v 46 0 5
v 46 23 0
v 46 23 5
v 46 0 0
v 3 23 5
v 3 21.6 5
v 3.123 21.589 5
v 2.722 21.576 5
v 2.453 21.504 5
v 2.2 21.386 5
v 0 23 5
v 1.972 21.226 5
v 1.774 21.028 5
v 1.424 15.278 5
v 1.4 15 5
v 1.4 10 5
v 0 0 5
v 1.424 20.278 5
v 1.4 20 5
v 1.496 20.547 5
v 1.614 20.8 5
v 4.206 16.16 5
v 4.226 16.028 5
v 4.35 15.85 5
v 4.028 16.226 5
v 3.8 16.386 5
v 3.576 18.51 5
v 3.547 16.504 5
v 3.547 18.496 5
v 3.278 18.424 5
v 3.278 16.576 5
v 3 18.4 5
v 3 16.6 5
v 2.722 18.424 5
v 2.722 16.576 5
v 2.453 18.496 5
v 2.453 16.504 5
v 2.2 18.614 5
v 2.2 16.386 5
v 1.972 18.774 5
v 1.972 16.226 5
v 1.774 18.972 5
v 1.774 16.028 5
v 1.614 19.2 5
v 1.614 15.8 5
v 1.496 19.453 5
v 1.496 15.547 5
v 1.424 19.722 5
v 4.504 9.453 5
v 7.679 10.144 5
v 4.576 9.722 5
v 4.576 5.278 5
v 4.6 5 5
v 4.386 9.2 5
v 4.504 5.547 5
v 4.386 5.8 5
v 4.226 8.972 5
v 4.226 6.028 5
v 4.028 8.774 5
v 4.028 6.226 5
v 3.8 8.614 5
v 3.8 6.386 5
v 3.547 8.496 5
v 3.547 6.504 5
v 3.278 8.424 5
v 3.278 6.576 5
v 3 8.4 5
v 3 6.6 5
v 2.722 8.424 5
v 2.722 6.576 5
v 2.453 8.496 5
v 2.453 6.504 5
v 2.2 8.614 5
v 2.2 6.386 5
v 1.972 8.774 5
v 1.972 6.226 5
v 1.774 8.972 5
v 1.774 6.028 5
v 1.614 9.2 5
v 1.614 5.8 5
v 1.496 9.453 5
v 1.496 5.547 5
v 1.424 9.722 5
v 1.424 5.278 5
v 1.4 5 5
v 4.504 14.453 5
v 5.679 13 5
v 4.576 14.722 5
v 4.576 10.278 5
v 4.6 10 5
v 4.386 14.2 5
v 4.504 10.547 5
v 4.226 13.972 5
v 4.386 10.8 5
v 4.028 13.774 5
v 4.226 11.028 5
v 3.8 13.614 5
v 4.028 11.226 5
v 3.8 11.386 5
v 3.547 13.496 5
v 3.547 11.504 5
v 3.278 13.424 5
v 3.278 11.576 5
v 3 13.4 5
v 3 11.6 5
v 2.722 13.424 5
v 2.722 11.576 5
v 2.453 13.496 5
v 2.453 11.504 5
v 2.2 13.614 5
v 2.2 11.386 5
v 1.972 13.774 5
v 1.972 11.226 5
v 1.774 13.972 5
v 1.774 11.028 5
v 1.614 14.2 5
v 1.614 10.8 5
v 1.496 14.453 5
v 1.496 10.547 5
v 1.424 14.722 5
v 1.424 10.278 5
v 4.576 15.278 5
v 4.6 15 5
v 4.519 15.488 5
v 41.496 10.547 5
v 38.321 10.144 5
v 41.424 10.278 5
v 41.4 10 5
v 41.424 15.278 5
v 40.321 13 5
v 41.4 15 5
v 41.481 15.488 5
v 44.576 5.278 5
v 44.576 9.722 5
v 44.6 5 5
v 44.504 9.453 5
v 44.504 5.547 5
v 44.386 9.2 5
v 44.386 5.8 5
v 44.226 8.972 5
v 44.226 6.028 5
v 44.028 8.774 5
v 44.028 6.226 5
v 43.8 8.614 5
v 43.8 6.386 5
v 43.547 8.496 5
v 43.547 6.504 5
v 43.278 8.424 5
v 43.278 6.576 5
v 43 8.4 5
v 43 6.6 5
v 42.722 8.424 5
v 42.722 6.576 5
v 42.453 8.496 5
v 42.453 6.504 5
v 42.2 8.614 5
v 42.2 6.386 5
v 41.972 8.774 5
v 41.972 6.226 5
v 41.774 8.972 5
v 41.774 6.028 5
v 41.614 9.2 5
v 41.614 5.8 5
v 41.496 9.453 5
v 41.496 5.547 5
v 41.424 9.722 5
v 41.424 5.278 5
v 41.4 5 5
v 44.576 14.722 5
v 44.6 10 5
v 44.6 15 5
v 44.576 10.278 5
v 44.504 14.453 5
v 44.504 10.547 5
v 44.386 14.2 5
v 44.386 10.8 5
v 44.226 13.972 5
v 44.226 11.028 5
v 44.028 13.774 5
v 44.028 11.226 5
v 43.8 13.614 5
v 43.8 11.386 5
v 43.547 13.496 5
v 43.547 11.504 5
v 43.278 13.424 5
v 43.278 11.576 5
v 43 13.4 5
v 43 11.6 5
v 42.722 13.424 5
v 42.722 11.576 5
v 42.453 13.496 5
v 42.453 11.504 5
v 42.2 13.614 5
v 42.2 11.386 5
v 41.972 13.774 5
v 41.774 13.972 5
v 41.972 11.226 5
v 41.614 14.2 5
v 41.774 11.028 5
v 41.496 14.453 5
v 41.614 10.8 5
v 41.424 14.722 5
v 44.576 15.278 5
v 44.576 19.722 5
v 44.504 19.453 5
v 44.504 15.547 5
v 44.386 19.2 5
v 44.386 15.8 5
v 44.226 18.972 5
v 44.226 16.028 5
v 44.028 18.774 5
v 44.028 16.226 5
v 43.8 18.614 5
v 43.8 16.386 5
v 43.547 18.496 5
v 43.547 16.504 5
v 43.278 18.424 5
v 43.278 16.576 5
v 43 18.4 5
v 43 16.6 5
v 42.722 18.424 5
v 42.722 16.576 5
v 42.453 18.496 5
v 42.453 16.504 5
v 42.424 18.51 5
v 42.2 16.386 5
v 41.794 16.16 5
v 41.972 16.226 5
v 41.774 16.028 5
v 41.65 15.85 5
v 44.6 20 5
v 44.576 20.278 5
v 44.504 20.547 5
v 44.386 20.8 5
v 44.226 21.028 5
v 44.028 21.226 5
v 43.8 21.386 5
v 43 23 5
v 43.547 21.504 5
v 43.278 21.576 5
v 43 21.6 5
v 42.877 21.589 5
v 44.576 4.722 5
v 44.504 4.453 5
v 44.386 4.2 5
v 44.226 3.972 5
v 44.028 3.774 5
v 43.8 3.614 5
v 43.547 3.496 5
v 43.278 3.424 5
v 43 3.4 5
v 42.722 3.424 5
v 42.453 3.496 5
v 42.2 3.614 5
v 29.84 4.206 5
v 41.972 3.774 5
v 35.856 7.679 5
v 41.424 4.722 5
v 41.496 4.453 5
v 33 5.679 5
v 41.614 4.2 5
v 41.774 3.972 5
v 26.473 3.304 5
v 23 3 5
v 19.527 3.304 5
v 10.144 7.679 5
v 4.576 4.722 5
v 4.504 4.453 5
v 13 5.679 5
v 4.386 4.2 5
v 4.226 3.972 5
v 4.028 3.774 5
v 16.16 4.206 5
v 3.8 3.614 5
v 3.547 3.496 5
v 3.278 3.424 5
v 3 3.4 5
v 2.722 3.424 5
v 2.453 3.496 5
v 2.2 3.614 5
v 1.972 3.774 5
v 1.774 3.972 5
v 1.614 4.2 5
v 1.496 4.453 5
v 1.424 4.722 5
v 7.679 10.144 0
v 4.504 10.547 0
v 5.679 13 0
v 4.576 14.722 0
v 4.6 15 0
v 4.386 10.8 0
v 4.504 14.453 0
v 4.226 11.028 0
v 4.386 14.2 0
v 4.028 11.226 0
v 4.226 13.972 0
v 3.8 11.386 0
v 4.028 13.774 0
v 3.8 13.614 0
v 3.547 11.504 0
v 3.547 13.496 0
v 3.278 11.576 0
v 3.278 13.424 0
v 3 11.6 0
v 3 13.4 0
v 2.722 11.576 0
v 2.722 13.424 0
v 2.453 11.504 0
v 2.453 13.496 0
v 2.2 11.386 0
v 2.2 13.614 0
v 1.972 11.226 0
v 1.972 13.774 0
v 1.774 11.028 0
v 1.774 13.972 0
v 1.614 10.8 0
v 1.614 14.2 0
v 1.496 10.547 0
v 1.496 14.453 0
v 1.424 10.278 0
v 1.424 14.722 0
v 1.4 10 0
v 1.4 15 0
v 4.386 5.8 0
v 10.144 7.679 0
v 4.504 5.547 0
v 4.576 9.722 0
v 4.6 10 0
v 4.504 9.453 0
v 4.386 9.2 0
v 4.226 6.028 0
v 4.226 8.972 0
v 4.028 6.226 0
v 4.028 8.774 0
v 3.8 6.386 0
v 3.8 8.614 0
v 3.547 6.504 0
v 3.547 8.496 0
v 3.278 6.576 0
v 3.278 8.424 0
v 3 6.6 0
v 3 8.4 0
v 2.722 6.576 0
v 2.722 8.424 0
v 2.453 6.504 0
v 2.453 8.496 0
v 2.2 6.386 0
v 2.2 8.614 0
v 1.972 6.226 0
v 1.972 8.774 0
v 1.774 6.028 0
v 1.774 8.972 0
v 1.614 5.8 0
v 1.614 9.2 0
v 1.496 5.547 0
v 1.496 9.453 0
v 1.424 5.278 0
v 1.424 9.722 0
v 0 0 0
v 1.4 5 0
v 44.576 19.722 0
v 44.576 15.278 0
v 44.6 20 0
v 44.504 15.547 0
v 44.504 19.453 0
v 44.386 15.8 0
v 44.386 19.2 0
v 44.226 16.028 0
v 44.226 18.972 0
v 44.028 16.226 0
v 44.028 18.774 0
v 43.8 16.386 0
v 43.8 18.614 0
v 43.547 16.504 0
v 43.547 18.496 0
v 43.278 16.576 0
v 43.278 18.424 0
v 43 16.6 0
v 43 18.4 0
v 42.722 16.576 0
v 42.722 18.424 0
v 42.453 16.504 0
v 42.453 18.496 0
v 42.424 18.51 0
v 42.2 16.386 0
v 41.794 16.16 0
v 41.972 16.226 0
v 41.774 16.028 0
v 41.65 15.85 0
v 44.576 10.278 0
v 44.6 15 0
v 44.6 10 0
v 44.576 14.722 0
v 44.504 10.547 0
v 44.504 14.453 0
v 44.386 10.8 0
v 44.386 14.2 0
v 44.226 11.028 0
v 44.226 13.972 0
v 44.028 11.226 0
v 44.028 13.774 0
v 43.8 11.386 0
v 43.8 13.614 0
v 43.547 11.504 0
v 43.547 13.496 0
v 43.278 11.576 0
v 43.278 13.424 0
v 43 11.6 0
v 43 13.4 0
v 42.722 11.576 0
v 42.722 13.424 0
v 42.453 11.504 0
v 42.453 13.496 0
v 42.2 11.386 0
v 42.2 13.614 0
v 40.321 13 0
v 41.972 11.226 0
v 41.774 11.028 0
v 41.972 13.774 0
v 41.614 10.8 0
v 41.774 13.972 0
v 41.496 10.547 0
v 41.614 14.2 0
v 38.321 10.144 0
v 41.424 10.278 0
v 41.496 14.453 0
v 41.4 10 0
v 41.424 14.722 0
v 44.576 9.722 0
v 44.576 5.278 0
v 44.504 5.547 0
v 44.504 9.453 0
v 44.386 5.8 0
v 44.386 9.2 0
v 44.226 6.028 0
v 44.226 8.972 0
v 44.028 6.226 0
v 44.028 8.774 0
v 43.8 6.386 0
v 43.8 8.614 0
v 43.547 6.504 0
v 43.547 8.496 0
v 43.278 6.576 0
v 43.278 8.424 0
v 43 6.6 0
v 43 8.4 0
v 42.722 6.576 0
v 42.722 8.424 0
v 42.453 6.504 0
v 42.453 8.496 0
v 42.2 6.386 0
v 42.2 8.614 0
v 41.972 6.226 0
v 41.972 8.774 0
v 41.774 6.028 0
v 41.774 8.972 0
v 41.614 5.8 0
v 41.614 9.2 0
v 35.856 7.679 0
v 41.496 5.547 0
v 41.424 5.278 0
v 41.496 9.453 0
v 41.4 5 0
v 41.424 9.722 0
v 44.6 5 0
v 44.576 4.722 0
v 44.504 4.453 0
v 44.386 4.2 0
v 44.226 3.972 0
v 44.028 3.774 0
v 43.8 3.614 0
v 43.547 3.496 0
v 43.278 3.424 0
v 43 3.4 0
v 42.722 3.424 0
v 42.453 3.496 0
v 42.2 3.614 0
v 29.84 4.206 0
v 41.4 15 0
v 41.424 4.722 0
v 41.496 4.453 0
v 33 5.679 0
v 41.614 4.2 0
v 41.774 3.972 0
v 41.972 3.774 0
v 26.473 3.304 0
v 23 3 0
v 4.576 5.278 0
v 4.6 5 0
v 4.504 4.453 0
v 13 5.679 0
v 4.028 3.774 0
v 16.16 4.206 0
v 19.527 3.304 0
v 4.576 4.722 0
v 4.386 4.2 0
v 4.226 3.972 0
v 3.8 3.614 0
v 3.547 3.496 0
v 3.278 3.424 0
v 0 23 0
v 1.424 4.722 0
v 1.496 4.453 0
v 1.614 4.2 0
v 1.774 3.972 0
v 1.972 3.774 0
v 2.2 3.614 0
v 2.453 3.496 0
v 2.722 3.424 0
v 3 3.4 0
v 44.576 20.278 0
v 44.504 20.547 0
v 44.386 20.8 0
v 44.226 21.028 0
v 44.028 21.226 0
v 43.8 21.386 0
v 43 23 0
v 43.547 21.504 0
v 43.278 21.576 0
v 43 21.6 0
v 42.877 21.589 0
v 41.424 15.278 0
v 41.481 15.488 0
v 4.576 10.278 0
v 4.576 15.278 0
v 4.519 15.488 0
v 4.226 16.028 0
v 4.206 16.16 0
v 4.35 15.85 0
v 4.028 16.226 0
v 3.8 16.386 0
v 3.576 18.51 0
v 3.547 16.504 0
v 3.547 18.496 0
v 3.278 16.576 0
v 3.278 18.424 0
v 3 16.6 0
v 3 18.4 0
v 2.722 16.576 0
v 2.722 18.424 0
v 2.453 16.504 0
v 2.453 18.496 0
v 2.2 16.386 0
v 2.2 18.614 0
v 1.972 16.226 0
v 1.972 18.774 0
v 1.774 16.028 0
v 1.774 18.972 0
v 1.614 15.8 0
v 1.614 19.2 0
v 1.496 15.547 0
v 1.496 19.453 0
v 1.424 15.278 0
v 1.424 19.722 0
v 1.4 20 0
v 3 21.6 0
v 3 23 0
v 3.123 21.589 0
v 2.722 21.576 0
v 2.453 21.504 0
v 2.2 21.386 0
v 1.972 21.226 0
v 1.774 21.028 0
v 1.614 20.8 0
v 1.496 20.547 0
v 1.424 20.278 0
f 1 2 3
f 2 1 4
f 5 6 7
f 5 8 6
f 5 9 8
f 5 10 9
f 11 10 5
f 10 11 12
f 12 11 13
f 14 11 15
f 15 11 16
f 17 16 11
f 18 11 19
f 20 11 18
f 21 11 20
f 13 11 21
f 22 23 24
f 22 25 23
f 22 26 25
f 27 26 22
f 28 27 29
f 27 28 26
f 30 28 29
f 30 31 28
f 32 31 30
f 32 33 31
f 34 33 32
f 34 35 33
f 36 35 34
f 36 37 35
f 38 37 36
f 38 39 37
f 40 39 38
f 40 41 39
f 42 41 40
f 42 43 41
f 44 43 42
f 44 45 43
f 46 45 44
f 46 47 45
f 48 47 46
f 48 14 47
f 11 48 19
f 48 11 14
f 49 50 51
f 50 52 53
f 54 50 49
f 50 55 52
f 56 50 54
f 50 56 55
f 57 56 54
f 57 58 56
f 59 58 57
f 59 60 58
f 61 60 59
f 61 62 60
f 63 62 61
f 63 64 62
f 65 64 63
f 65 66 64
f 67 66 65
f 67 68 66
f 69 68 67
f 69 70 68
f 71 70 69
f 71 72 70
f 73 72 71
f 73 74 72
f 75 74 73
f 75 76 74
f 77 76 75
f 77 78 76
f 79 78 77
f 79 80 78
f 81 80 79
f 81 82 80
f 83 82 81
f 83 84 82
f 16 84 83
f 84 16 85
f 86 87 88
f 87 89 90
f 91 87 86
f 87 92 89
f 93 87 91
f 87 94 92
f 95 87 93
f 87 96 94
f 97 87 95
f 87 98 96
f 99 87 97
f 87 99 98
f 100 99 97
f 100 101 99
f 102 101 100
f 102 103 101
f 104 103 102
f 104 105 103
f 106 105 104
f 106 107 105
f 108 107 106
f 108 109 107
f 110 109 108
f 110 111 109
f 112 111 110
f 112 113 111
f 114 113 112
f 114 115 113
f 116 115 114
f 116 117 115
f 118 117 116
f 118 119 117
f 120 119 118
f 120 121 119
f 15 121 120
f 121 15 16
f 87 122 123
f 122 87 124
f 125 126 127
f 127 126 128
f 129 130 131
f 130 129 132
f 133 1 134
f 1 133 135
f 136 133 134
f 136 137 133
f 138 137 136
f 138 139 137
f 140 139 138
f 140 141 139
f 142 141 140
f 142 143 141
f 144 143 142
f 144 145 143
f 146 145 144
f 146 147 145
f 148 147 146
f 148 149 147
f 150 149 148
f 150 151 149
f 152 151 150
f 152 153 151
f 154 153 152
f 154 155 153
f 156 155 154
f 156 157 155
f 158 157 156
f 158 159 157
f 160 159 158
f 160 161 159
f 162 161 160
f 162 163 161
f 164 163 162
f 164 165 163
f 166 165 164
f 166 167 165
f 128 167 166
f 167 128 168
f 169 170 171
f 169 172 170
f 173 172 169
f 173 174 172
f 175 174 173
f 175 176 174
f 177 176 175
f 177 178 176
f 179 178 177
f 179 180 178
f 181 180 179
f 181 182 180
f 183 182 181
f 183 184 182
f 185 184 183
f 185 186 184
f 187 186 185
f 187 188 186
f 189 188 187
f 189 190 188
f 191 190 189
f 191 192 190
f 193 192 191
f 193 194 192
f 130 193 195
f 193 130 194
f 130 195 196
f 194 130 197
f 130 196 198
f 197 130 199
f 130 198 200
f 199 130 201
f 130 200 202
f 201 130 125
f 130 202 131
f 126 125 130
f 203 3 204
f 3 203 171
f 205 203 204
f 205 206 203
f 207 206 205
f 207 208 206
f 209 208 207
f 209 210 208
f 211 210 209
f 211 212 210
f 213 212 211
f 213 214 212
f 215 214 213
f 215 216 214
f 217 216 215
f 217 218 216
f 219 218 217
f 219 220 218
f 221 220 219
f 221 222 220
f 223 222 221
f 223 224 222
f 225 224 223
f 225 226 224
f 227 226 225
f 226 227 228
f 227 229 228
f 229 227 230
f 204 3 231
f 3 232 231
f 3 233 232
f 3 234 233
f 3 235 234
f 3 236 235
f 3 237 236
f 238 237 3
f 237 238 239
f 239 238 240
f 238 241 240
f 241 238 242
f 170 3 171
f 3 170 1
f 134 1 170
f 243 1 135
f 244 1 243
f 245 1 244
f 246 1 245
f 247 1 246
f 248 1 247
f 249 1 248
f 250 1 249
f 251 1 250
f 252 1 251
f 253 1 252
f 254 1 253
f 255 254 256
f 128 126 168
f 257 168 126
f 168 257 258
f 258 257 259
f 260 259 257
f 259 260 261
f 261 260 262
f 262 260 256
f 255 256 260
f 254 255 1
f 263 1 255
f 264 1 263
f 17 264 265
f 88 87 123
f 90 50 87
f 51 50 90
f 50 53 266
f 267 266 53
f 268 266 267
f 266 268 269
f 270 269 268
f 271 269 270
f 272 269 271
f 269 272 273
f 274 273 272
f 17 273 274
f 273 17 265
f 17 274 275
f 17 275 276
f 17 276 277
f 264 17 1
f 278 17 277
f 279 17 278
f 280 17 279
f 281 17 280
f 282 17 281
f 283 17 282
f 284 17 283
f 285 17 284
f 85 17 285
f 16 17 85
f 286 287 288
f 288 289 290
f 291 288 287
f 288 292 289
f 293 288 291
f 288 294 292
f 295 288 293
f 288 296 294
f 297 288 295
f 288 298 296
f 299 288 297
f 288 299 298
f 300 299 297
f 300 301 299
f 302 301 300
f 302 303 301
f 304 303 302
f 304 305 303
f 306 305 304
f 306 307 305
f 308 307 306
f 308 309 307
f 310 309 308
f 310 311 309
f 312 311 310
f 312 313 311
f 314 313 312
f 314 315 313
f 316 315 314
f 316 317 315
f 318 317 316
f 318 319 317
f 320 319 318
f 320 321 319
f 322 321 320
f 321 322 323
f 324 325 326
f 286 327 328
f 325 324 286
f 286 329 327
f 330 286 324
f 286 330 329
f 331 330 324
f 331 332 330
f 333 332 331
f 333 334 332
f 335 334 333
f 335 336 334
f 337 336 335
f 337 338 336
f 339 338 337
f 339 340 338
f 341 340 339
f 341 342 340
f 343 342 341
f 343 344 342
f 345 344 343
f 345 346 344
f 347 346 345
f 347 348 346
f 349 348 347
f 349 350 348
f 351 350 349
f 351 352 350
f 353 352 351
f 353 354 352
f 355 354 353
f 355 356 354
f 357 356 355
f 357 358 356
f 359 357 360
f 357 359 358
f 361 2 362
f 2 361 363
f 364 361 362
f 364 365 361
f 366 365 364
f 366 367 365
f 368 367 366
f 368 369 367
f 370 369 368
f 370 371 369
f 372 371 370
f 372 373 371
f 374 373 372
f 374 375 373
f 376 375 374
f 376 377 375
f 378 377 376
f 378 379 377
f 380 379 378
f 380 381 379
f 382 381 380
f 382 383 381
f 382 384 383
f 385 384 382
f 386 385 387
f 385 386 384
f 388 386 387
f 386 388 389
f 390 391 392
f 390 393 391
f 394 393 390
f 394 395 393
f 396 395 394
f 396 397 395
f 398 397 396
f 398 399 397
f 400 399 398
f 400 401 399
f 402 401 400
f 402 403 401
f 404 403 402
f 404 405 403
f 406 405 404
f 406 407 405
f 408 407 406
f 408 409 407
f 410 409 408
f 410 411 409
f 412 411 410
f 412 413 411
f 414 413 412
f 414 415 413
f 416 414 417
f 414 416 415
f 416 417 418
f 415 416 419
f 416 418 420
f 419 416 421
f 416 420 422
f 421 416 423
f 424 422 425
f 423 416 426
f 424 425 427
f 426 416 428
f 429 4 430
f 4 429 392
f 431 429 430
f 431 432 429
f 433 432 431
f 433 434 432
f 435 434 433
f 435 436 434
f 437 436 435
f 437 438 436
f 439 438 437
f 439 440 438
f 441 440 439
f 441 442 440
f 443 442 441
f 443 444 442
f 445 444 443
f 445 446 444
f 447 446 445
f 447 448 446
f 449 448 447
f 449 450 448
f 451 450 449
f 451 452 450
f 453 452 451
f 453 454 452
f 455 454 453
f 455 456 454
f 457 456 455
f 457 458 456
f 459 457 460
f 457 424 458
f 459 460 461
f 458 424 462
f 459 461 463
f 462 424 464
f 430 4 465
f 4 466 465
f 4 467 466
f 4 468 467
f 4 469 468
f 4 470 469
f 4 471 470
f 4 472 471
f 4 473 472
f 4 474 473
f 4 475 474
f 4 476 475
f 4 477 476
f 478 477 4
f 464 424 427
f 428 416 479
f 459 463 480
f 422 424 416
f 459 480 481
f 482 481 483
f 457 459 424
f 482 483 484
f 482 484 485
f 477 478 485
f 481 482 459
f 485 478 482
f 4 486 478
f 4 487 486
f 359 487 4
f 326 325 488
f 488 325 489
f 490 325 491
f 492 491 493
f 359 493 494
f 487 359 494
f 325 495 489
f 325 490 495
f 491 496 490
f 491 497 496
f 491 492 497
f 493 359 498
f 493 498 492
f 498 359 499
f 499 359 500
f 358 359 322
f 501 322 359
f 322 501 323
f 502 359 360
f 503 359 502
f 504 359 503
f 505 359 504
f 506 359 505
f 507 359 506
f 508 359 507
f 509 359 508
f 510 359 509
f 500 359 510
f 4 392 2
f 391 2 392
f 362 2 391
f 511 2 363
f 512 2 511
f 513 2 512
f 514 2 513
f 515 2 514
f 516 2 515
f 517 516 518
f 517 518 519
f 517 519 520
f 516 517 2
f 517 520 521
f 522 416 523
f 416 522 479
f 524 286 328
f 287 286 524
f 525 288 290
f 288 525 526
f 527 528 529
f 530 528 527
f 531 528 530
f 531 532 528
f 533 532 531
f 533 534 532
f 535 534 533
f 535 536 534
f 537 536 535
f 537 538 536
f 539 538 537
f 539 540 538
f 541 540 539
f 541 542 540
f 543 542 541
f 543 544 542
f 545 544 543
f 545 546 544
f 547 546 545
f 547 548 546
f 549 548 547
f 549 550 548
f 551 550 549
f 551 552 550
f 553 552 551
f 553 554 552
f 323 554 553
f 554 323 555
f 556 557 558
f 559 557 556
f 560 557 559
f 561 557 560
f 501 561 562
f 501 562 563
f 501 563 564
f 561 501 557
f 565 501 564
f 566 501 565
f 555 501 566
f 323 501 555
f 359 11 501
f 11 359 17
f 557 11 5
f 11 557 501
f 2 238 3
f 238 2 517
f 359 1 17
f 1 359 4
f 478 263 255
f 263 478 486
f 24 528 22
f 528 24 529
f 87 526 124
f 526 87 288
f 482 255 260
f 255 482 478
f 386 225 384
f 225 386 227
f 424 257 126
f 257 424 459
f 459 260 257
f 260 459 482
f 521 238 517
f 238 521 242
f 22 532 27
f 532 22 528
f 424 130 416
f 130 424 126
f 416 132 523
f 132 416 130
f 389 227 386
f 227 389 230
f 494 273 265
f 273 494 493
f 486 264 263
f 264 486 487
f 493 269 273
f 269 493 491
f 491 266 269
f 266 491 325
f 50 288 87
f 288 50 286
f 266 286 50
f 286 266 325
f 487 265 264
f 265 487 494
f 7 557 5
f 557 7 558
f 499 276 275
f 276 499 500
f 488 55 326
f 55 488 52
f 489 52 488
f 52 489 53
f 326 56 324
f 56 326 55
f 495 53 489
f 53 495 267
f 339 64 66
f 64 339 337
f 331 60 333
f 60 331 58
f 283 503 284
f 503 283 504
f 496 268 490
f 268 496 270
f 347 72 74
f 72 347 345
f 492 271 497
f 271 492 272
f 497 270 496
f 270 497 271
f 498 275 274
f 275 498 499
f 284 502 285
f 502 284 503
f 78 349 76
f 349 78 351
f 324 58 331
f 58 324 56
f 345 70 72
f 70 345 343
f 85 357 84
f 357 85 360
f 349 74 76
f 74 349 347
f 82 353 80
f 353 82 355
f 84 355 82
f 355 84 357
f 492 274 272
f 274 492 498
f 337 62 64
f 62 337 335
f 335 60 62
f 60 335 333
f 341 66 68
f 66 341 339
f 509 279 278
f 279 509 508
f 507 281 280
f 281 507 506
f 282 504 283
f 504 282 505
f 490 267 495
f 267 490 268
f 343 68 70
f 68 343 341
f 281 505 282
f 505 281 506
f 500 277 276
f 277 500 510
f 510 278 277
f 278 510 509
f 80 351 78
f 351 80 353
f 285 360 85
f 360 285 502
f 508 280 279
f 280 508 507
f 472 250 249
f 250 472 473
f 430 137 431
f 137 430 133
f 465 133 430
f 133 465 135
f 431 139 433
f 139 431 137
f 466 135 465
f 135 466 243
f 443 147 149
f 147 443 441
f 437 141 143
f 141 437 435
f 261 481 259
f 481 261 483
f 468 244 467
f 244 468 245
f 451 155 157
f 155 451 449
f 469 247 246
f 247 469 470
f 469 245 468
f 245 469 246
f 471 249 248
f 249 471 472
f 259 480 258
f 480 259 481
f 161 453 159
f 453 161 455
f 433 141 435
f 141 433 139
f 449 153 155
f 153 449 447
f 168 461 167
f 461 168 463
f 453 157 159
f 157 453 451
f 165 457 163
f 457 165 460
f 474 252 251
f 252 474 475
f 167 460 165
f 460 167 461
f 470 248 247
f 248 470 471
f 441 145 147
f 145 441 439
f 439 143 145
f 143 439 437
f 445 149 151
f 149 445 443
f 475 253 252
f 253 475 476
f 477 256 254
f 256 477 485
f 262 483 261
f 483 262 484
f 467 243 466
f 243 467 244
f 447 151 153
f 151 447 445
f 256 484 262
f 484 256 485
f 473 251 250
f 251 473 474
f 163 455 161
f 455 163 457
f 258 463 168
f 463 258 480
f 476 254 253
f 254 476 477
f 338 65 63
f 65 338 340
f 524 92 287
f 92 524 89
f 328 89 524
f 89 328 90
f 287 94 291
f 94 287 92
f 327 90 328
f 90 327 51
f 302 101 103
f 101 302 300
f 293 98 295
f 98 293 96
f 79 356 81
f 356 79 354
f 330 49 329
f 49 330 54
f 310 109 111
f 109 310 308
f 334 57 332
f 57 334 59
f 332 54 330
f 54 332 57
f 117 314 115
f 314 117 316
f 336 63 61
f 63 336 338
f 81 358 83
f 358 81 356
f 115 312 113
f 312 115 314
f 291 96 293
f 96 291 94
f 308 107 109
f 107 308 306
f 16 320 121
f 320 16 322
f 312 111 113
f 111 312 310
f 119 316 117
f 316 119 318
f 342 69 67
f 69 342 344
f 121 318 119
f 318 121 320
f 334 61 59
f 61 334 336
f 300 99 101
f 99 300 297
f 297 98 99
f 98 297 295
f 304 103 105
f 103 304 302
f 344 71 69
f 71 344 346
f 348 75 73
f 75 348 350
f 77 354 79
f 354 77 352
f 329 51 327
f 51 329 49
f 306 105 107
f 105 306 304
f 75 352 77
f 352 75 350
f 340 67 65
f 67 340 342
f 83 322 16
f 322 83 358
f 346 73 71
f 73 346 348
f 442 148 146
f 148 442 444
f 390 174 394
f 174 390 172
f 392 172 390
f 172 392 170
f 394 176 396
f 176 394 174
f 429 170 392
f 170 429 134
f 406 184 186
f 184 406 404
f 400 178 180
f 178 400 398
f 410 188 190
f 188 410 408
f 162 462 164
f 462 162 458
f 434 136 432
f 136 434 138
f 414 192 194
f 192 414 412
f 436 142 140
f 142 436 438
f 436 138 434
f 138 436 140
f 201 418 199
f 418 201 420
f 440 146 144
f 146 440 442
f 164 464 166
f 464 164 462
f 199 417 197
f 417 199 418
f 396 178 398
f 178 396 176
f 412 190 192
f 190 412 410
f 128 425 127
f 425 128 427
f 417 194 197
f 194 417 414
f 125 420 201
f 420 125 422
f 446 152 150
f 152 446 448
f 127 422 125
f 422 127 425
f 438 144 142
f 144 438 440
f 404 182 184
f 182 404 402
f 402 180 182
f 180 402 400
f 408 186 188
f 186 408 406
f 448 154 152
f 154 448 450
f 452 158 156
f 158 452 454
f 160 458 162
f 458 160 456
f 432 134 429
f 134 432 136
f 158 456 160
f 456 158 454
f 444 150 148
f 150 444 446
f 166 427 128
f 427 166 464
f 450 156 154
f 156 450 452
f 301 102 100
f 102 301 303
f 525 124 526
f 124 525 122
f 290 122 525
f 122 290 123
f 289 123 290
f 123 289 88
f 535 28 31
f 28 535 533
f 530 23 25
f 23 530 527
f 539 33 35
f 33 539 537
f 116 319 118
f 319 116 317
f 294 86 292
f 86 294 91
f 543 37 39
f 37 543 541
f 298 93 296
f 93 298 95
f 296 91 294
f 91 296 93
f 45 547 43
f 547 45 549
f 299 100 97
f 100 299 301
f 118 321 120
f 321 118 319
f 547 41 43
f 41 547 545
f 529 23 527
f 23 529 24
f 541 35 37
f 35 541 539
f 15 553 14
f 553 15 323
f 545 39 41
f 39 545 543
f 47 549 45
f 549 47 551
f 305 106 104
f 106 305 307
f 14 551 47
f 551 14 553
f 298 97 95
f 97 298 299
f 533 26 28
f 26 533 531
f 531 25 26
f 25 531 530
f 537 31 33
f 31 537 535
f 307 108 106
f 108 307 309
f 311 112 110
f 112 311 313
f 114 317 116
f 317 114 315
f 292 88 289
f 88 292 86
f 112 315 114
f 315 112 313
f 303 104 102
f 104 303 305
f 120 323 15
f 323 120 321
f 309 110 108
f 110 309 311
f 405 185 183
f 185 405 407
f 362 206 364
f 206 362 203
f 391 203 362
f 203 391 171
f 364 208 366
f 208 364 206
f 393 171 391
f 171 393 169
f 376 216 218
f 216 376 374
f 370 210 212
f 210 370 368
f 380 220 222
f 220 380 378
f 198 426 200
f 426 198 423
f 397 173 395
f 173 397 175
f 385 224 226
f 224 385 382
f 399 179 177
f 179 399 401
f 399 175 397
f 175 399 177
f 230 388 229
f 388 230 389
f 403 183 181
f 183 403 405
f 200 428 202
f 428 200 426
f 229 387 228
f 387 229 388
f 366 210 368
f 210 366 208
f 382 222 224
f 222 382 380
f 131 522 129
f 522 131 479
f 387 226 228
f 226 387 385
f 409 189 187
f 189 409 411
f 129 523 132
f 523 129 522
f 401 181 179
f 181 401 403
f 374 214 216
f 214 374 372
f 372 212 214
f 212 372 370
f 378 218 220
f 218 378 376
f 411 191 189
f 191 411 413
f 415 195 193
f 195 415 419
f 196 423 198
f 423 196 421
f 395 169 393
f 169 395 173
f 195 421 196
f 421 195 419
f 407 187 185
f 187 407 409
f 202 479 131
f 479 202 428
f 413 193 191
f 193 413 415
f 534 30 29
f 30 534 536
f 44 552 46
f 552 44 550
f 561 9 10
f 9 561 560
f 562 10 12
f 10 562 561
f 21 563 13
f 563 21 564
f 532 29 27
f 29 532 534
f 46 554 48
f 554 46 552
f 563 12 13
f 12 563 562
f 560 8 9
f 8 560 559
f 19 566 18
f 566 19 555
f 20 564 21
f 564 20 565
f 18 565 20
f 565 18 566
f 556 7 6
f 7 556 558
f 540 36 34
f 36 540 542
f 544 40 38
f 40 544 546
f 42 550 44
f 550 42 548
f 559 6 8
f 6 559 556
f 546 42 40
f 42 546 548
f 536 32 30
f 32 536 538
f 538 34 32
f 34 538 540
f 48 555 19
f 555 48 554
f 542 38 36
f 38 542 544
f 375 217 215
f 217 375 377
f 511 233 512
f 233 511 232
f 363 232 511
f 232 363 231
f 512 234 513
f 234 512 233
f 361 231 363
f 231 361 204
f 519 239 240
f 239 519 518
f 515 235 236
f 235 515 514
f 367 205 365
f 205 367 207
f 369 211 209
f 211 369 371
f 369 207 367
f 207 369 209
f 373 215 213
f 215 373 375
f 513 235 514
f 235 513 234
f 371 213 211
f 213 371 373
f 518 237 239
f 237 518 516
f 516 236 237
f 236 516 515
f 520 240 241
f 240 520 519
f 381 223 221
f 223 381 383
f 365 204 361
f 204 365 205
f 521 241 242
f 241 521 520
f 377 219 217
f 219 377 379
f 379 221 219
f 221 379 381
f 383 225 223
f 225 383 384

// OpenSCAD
$fn=36;

difference() {
    union(){
        // the upper part for attachement to the chassis
        difference(){
            cube([46, 23, 5]);
            // need to remove this bit so that it doesn't cover the holes for the motor
            translate([23, 23, -2]){
                cylinder(r=20, h=10);
            }
        }

        linear_extrude(height=5){
            import("TruckGearBoxPlate.dxf", center=true);
        }
    }
    
    
    // fixation holes
    for ( i = [1 : 4] ){
        translate([3, i * 5, -1]){
            cylinder(r=1.6, h=10);
        }
        translate([43, i * 5, -1]){
            cylinder(r=1.6, h=10);
        }
    }
    
    // countersink for motor screws
    translate([23, 7.5, -1]){
        cylinder(r=3, h=3);
    }
    translate([23, 23.2, -1]){
        cylinder(r=3, h=3);
    }
}

difference() {
    translate([5, 12.5, -20]){
        linear_extrude(height=20){
            import("TruckGearBoxContour.dxf");
        }
    }
    
    translate([23, 14.5, -7]){
        cylinder(r=5.5, h=10);
    }
}
